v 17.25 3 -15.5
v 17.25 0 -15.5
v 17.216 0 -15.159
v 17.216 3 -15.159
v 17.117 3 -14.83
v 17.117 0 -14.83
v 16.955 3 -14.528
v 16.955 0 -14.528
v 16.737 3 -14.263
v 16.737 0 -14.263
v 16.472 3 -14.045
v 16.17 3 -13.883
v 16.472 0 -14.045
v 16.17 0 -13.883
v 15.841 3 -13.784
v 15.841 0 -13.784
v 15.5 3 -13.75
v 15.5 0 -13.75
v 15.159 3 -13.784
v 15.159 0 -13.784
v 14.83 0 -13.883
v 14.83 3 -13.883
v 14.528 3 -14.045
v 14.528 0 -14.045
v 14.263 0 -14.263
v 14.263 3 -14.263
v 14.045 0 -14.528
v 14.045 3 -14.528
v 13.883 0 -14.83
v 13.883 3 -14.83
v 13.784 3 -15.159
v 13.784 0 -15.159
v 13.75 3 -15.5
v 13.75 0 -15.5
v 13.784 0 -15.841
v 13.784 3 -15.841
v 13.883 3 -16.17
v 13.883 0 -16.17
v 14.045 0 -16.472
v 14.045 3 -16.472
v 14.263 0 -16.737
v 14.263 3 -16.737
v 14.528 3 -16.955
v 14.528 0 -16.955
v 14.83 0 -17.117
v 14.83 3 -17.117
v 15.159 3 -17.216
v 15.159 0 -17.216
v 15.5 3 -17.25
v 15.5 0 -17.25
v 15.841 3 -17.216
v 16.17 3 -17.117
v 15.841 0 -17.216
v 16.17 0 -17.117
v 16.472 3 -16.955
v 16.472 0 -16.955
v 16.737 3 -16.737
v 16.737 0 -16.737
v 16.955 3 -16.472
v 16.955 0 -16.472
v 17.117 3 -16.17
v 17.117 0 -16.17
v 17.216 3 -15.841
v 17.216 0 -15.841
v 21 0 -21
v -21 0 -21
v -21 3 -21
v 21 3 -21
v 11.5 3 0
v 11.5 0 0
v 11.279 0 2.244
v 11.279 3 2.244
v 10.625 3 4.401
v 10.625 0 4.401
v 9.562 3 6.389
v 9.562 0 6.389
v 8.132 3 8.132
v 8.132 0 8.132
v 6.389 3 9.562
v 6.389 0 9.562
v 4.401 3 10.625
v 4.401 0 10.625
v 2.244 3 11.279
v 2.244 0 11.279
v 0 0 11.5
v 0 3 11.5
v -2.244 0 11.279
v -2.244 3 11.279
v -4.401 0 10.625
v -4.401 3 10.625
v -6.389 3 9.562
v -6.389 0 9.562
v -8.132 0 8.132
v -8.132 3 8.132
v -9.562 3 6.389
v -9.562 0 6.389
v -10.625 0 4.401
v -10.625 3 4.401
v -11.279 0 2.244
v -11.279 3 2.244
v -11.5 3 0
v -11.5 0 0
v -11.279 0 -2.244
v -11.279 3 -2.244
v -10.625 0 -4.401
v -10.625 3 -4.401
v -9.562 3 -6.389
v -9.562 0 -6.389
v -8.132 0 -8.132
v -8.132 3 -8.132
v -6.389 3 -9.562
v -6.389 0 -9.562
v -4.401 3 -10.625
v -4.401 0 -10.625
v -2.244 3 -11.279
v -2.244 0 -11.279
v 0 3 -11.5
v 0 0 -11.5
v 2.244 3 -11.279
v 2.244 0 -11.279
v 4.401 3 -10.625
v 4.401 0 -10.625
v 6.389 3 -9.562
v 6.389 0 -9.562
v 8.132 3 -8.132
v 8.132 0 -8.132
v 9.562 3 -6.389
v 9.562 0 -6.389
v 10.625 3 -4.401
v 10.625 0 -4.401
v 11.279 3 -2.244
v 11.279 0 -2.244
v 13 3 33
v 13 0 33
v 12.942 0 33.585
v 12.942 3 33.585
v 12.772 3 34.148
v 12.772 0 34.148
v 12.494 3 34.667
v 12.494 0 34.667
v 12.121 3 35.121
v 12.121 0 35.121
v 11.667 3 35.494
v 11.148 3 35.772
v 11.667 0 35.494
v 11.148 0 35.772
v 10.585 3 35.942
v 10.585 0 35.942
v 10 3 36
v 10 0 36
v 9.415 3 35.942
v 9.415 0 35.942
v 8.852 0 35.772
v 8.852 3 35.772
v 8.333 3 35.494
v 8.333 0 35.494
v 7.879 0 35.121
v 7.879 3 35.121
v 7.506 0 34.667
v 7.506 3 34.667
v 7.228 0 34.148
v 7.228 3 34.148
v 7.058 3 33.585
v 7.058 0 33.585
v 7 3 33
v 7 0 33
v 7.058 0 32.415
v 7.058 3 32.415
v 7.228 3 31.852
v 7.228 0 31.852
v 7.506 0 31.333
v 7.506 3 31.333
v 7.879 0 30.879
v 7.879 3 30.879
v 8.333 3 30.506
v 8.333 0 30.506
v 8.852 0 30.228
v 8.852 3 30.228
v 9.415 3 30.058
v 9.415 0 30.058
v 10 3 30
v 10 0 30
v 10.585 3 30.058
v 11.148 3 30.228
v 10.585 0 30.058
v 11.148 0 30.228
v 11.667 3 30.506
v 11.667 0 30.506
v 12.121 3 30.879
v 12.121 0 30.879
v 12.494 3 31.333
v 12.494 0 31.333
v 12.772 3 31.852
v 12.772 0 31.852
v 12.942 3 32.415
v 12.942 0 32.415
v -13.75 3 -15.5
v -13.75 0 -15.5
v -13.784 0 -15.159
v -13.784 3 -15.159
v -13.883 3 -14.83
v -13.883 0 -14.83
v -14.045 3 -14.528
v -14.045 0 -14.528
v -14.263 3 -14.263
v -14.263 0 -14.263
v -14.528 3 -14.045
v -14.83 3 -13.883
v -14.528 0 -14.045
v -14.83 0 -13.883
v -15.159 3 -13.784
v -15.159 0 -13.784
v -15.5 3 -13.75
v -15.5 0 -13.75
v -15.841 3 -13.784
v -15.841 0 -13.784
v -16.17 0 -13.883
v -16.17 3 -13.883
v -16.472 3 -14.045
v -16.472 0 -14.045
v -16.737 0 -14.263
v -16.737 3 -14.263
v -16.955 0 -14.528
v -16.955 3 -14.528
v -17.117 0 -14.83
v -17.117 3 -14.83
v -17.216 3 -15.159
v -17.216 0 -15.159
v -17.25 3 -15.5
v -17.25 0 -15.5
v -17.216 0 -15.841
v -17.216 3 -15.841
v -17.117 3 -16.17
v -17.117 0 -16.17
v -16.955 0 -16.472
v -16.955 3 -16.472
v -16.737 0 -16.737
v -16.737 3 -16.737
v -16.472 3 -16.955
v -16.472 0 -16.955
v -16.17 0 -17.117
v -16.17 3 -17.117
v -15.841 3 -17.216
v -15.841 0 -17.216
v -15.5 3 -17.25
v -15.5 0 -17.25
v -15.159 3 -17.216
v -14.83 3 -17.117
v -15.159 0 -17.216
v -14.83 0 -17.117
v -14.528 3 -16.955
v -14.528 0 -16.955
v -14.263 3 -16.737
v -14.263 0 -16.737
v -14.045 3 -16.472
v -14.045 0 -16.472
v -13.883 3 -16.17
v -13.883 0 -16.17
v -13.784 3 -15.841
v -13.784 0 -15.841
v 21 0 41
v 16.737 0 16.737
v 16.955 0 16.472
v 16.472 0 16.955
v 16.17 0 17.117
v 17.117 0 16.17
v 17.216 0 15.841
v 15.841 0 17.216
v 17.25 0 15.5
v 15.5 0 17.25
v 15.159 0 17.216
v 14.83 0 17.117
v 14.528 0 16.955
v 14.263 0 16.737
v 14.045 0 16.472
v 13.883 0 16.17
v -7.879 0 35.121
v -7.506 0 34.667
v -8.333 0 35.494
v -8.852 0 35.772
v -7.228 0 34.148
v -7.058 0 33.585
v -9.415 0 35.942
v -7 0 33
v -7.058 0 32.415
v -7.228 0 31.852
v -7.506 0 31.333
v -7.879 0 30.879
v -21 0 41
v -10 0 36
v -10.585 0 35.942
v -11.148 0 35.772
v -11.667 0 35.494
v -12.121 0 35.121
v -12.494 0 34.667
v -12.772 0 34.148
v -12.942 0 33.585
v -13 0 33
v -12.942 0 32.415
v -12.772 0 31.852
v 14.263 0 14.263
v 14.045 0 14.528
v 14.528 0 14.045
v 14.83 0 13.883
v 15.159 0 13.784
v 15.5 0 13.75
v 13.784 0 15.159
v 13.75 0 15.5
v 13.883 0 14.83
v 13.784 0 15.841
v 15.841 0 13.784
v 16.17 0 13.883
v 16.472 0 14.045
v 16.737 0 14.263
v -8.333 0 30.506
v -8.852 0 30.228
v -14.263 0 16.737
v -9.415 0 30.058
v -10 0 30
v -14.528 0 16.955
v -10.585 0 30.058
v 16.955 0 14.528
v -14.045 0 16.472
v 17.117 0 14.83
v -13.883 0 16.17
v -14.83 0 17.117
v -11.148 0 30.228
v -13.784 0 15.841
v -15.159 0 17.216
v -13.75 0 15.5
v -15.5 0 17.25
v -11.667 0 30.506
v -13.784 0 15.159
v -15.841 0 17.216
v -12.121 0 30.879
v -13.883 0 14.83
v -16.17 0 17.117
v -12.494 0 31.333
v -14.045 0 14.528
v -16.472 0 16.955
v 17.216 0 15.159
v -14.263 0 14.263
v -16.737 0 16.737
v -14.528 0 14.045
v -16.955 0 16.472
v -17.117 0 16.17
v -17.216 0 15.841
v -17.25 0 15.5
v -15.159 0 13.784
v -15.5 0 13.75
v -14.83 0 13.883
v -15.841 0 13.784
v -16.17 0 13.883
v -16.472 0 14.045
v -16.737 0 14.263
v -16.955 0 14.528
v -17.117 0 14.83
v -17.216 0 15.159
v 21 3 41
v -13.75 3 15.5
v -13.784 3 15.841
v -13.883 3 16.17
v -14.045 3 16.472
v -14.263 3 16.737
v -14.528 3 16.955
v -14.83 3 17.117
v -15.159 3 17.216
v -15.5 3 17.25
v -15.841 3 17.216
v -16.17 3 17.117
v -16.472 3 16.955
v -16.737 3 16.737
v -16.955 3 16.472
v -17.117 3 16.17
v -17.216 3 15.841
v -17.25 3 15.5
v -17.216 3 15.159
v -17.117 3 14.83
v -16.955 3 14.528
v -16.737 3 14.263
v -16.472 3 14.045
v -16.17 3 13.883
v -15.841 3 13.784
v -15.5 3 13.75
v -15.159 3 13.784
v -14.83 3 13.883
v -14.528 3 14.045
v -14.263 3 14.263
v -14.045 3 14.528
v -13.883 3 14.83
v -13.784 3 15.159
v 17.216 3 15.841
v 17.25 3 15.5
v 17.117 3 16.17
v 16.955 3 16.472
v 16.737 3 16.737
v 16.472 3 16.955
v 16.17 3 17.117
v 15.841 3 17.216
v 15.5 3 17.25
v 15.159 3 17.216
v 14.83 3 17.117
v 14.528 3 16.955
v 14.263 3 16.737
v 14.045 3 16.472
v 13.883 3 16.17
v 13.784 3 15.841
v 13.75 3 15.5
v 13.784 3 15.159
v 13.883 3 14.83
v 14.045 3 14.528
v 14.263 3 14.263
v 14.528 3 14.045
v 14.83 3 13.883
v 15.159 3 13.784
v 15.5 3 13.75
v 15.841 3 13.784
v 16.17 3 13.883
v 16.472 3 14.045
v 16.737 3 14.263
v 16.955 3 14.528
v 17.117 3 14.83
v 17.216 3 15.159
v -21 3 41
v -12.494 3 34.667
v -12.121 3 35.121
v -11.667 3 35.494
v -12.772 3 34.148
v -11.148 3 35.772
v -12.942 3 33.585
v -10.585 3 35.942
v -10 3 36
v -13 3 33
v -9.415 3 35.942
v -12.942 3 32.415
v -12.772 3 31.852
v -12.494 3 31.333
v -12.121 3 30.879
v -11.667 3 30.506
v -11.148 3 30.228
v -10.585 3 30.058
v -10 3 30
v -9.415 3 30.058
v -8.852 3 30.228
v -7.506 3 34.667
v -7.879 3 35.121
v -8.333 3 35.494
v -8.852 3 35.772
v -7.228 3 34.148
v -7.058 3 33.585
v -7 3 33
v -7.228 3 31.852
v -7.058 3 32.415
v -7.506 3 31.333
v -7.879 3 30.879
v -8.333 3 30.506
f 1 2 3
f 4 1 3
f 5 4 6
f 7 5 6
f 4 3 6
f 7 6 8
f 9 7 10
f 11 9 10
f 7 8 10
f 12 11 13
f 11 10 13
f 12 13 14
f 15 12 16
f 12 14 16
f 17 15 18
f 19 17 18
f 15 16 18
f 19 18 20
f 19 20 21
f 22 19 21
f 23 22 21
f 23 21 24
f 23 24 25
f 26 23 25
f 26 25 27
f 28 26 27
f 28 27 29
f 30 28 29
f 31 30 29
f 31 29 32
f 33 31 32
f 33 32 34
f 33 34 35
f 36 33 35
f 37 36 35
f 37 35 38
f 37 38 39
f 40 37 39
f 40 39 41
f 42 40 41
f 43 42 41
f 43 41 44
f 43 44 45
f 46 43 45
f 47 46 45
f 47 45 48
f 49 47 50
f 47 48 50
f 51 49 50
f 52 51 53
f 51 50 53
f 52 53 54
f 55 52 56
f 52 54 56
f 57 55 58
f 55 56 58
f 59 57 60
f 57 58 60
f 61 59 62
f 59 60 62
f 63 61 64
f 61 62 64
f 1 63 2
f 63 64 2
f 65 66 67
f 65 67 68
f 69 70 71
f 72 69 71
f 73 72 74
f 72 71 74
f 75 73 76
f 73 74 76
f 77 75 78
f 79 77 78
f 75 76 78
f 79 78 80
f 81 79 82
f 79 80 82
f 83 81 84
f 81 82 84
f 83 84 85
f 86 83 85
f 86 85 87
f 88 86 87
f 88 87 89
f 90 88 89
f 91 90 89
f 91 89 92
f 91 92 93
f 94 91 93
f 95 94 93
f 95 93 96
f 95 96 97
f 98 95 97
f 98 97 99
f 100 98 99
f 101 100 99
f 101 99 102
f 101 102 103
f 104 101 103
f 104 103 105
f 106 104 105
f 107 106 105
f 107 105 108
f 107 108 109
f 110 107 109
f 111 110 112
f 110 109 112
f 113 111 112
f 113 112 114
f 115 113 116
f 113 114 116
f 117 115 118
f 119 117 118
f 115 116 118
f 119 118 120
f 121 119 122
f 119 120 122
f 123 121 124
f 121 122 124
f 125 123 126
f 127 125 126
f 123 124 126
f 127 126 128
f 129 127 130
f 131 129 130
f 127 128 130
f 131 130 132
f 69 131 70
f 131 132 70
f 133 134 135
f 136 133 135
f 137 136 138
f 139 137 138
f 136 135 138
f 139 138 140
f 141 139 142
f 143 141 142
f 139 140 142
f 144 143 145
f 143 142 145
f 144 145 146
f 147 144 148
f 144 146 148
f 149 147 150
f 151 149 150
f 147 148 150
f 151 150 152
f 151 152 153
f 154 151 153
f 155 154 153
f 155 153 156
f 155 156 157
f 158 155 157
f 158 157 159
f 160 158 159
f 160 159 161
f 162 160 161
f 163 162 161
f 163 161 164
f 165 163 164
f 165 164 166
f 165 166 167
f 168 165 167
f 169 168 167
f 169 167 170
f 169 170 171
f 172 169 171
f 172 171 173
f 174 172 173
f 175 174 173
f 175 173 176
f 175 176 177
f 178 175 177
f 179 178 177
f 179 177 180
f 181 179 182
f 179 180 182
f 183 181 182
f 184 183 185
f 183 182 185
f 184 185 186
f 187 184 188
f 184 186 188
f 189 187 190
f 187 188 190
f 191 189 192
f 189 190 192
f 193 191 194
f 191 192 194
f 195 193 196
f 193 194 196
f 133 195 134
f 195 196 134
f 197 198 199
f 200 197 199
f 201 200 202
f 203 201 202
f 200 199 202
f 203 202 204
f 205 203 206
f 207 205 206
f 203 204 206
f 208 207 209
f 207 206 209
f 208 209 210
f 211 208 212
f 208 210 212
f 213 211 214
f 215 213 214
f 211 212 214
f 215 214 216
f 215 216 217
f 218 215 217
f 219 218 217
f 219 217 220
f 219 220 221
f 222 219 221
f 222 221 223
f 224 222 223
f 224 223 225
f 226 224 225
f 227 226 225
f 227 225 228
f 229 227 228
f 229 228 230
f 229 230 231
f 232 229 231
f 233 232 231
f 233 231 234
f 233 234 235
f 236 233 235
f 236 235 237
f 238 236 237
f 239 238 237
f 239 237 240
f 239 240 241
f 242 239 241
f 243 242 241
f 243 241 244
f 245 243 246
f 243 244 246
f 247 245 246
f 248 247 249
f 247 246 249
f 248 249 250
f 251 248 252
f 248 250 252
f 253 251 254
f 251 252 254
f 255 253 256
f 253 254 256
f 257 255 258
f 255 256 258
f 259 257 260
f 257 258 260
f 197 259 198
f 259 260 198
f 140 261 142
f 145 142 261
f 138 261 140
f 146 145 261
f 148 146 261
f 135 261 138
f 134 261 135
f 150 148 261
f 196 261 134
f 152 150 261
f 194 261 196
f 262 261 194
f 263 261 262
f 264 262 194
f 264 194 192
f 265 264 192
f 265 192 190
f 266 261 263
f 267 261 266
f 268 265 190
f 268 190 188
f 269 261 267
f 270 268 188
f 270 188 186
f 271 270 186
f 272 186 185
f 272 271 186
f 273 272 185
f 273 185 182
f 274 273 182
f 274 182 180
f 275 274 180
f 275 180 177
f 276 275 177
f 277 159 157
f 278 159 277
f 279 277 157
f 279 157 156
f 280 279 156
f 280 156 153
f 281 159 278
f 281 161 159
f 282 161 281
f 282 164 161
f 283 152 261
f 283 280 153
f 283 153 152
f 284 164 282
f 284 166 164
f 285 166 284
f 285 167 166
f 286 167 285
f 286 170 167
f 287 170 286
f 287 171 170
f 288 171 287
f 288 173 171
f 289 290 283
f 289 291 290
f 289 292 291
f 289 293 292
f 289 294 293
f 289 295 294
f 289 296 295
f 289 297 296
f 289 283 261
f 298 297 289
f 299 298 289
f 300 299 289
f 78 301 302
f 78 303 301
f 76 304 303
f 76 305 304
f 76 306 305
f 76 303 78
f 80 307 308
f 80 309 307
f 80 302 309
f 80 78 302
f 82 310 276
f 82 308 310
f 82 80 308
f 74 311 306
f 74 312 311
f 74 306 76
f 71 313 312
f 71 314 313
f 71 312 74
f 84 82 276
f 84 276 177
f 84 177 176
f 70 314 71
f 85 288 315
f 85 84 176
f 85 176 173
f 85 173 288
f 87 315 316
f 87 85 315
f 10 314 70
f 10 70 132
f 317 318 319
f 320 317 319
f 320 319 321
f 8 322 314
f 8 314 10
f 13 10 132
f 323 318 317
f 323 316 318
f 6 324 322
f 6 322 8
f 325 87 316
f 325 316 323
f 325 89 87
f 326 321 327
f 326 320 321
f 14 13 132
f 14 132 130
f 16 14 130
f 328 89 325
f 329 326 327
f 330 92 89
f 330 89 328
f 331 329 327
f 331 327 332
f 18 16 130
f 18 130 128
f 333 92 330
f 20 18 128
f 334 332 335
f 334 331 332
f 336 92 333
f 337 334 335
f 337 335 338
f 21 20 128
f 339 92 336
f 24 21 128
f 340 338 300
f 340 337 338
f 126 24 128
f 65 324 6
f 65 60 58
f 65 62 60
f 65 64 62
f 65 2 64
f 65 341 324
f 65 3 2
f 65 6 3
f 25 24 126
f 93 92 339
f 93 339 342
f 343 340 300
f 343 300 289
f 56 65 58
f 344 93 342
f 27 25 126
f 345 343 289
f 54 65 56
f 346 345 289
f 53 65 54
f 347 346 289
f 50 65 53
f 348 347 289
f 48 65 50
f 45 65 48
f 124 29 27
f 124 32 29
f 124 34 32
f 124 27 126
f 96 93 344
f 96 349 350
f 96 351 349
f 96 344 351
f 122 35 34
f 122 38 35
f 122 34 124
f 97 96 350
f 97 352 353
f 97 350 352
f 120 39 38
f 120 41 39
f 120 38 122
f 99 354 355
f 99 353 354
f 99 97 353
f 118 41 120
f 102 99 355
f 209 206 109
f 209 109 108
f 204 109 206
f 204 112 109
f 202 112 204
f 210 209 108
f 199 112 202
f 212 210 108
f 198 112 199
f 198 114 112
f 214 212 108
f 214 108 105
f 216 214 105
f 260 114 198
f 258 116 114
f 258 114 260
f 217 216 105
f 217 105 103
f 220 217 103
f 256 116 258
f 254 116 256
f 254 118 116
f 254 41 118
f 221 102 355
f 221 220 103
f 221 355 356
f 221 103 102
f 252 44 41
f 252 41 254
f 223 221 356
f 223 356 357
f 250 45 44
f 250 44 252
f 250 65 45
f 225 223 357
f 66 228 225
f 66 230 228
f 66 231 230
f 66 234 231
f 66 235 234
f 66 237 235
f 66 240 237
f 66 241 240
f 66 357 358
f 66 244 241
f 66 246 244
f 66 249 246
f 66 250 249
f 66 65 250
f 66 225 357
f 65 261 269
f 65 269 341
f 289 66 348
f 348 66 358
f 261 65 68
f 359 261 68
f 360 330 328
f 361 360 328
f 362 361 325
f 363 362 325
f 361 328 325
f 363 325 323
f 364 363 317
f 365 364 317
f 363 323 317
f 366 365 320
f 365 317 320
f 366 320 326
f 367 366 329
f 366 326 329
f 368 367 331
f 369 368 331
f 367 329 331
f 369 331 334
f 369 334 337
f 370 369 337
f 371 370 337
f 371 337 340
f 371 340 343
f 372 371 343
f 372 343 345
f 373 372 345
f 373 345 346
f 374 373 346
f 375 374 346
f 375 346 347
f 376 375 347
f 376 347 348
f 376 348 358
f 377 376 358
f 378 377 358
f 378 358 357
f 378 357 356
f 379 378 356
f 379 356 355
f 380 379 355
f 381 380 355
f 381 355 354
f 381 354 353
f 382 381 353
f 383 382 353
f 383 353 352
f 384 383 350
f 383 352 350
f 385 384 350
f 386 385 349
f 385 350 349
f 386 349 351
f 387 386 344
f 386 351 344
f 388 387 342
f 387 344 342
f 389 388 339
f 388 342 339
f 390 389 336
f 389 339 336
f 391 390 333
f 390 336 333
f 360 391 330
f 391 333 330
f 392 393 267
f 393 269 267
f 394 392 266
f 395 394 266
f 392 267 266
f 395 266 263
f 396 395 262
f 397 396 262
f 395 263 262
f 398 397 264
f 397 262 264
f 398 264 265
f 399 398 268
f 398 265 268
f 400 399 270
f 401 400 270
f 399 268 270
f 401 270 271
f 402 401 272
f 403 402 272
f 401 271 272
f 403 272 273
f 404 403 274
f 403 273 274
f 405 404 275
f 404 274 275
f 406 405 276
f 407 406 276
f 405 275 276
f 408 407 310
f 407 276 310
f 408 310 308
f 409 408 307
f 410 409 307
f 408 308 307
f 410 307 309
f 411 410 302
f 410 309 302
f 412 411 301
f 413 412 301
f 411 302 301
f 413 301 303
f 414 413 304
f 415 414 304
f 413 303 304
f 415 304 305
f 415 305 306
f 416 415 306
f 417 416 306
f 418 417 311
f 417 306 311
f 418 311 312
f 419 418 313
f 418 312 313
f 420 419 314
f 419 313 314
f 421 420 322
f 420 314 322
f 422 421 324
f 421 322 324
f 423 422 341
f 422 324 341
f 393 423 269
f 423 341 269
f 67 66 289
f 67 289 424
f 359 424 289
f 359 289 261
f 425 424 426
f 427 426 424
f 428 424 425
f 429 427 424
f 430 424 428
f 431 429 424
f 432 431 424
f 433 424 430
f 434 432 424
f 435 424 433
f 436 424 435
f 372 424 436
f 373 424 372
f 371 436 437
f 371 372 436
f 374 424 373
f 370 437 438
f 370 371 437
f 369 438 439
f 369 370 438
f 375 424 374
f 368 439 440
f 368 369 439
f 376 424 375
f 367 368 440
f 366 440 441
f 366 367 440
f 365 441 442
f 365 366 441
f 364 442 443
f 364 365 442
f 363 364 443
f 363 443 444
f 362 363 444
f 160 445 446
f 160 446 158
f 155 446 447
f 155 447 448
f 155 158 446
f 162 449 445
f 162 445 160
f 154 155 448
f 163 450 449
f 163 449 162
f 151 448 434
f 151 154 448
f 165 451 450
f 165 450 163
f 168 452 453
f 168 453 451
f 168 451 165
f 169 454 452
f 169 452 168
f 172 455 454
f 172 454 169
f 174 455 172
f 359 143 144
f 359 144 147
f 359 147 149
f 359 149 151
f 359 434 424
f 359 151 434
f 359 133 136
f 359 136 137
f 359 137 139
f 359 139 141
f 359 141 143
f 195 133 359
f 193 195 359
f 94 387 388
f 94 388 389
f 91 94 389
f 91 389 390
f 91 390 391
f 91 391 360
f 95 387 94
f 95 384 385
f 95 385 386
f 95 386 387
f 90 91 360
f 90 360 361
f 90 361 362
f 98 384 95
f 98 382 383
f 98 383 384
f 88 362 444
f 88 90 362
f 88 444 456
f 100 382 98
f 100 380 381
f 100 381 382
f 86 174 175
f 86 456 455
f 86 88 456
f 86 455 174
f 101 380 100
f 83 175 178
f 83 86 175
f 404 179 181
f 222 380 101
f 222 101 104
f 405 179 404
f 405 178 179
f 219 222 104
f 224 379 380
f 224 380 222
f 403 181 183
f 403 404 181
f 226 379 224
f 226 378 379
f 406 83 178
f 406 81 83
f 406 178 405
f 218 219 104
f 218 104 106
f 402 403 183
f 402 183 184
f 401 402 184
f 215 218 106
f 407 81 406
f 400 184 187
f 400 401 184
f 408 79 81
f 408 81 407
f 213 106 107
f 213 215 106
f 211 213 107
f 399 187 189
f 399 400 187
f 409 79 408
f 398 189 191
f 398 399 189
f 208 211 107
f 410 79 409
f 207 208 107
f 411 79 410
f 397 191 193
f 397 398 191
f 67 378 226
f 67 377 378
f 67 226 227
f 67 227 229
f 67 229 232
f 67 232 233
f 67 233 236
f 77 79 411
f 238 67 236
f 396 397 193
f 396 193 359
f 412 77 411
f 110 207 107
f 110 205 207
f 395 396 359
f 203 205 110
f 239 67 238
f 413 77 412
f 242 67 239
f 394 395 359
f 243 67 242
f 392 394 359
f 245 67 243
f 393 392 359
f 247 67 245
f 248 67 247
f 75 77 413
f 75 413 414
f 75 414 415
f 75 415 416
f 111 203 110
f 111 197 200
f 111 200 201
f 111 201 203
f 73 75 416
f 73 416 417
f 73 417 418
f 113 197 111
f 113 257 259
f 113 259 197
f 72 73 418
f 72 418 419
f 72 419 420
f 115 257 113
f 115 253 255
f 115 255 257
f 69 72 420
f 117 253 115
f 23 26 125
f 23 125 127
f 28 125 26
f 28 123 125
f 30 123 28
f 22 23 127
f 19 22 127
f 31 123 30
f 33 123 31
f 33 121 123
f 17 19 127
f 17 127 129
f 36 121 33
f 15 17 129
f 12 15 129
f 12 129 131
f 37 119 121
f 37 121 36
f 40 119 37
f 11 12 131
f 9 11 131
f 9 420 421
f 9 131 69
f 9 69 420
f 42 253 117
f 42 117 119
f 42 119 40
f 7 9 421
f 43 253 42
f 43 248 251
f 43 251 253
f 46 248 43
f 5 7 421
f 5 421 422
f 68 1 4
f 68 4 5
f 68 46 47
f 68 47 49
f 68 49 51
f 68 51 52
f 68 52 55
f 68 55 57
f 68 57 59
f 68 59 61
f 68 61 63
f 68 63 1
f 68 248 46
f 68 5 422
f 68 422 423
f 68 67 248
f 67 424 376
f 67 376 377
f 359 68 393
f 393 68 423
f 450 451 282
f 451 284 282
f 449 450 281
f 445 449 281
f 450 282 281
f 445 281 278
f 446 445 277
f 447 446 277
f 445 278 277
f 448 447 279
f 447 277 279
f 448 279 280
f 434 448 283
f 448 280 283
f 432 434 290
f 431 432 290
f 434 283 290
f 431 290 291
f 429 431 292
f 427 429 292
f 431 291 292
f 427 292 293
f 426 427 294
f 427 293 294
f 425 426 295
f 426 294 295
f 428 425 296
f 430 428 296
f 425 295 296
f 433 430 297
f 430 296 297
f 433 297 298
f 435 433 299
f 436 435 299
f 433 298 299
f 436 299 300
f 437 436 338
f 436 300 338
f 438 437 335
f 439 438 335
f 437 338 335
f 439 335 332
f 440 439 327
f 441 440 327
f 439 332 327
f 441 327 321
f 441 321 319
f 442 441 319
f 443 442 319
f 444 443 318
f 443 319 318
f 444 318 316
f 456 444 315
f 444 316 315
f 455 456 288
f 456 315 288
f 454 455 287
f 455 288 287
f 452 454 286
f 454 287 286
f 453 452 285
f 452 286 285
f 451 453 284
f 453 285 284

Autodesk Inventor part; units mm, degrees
ref_plane "YZ Plane" through (0, 0, 0) normal (1, 0, 0) x (0, 1, 0)
ref_plane "XZ Plane" through (0, 0, 0) normal (0, 1, 0) x (-1, 0, 0)
ref_plane "XY Plane" through (0, 0, 0) normal (0, 0, 1) x (1, 0, 0)
sketch "草图2" plane through (0, 0, 0) normal (0, 1, 0) x (-1, 0, 0)
  line L0 (-21, 21) -> (21, 21)
  line L1 (21, 21) -> (21, -21)
  line L2 (21, -21) -> (-21, -21)
  line L3 (-21, -21) -> (-21, 21)
  line L4 (-21, 21) -> (21, -21) construction
  line L5 (21, 21) -> (-21, -21) construction
  point P0 (0, 0)
  dimension "d3" = 42
  dimension "d4" = 42
extrude "拉伸2" add sketch "草图2" along normal blind 3
sketch "草图7" plane through (0, 0, 0) normal (0, -1, 0) x (1, 0, 0)
  circle A0 centre (0, 0) radius 11.5
  circle A1 centre (-15.5, 15.5) radius 1.75
  circle A2 centre (-15.5, -15.5) radius 1.75
  circle A3 centre (15.5, -15.5) radius 1.75
  circle A4 centre (15.5, 15.5) radius 1.75
  dimension "d17" = 23
  dimension "d18" = 3.5
  dimension "d19" = 15.5
  dimension "d20" = 15.5
  dimension "d21" = 15.5
  dimension "d22" = 15.5
extrude "拉伸6" cut sketch "草图7" against normal blind 3
sketch "草图14" plane through (-21, 0, 21) normal (0, 0, 1) x (1, 0, 0)
  line L0 (42, 0) -> (0, 0) projected
  line L1 (42, 0) -> (42, 3) projected
  line L2 (0, 3) -> (42, 3) projected
  line L3 (0, 0) -> (0, 3) projected
  point P0 (21, 0)
extrude "拉伸13" add sketch "草图14" along normal blind 20
sketch "草图15" plane through (0, 0, 0) normal (0, -1, 0) x (1, 0, 0)
  line L0 (0, 53.4) -> (0, -33.4) construction
  circle A0 centre (10, 33) radius 3
  line L1 (-21, 41) -> (21, 41) projected
  circle A1 centre (-10, 33) radius 3
  point P0 (0, 0)
  dimension "d51" = 6
  dimension "d52" = 10
  dimension "d53" = 8
extrude "拉伸15" cut sketch "草图15" against normal blind 10
properties part number "电机座3"
